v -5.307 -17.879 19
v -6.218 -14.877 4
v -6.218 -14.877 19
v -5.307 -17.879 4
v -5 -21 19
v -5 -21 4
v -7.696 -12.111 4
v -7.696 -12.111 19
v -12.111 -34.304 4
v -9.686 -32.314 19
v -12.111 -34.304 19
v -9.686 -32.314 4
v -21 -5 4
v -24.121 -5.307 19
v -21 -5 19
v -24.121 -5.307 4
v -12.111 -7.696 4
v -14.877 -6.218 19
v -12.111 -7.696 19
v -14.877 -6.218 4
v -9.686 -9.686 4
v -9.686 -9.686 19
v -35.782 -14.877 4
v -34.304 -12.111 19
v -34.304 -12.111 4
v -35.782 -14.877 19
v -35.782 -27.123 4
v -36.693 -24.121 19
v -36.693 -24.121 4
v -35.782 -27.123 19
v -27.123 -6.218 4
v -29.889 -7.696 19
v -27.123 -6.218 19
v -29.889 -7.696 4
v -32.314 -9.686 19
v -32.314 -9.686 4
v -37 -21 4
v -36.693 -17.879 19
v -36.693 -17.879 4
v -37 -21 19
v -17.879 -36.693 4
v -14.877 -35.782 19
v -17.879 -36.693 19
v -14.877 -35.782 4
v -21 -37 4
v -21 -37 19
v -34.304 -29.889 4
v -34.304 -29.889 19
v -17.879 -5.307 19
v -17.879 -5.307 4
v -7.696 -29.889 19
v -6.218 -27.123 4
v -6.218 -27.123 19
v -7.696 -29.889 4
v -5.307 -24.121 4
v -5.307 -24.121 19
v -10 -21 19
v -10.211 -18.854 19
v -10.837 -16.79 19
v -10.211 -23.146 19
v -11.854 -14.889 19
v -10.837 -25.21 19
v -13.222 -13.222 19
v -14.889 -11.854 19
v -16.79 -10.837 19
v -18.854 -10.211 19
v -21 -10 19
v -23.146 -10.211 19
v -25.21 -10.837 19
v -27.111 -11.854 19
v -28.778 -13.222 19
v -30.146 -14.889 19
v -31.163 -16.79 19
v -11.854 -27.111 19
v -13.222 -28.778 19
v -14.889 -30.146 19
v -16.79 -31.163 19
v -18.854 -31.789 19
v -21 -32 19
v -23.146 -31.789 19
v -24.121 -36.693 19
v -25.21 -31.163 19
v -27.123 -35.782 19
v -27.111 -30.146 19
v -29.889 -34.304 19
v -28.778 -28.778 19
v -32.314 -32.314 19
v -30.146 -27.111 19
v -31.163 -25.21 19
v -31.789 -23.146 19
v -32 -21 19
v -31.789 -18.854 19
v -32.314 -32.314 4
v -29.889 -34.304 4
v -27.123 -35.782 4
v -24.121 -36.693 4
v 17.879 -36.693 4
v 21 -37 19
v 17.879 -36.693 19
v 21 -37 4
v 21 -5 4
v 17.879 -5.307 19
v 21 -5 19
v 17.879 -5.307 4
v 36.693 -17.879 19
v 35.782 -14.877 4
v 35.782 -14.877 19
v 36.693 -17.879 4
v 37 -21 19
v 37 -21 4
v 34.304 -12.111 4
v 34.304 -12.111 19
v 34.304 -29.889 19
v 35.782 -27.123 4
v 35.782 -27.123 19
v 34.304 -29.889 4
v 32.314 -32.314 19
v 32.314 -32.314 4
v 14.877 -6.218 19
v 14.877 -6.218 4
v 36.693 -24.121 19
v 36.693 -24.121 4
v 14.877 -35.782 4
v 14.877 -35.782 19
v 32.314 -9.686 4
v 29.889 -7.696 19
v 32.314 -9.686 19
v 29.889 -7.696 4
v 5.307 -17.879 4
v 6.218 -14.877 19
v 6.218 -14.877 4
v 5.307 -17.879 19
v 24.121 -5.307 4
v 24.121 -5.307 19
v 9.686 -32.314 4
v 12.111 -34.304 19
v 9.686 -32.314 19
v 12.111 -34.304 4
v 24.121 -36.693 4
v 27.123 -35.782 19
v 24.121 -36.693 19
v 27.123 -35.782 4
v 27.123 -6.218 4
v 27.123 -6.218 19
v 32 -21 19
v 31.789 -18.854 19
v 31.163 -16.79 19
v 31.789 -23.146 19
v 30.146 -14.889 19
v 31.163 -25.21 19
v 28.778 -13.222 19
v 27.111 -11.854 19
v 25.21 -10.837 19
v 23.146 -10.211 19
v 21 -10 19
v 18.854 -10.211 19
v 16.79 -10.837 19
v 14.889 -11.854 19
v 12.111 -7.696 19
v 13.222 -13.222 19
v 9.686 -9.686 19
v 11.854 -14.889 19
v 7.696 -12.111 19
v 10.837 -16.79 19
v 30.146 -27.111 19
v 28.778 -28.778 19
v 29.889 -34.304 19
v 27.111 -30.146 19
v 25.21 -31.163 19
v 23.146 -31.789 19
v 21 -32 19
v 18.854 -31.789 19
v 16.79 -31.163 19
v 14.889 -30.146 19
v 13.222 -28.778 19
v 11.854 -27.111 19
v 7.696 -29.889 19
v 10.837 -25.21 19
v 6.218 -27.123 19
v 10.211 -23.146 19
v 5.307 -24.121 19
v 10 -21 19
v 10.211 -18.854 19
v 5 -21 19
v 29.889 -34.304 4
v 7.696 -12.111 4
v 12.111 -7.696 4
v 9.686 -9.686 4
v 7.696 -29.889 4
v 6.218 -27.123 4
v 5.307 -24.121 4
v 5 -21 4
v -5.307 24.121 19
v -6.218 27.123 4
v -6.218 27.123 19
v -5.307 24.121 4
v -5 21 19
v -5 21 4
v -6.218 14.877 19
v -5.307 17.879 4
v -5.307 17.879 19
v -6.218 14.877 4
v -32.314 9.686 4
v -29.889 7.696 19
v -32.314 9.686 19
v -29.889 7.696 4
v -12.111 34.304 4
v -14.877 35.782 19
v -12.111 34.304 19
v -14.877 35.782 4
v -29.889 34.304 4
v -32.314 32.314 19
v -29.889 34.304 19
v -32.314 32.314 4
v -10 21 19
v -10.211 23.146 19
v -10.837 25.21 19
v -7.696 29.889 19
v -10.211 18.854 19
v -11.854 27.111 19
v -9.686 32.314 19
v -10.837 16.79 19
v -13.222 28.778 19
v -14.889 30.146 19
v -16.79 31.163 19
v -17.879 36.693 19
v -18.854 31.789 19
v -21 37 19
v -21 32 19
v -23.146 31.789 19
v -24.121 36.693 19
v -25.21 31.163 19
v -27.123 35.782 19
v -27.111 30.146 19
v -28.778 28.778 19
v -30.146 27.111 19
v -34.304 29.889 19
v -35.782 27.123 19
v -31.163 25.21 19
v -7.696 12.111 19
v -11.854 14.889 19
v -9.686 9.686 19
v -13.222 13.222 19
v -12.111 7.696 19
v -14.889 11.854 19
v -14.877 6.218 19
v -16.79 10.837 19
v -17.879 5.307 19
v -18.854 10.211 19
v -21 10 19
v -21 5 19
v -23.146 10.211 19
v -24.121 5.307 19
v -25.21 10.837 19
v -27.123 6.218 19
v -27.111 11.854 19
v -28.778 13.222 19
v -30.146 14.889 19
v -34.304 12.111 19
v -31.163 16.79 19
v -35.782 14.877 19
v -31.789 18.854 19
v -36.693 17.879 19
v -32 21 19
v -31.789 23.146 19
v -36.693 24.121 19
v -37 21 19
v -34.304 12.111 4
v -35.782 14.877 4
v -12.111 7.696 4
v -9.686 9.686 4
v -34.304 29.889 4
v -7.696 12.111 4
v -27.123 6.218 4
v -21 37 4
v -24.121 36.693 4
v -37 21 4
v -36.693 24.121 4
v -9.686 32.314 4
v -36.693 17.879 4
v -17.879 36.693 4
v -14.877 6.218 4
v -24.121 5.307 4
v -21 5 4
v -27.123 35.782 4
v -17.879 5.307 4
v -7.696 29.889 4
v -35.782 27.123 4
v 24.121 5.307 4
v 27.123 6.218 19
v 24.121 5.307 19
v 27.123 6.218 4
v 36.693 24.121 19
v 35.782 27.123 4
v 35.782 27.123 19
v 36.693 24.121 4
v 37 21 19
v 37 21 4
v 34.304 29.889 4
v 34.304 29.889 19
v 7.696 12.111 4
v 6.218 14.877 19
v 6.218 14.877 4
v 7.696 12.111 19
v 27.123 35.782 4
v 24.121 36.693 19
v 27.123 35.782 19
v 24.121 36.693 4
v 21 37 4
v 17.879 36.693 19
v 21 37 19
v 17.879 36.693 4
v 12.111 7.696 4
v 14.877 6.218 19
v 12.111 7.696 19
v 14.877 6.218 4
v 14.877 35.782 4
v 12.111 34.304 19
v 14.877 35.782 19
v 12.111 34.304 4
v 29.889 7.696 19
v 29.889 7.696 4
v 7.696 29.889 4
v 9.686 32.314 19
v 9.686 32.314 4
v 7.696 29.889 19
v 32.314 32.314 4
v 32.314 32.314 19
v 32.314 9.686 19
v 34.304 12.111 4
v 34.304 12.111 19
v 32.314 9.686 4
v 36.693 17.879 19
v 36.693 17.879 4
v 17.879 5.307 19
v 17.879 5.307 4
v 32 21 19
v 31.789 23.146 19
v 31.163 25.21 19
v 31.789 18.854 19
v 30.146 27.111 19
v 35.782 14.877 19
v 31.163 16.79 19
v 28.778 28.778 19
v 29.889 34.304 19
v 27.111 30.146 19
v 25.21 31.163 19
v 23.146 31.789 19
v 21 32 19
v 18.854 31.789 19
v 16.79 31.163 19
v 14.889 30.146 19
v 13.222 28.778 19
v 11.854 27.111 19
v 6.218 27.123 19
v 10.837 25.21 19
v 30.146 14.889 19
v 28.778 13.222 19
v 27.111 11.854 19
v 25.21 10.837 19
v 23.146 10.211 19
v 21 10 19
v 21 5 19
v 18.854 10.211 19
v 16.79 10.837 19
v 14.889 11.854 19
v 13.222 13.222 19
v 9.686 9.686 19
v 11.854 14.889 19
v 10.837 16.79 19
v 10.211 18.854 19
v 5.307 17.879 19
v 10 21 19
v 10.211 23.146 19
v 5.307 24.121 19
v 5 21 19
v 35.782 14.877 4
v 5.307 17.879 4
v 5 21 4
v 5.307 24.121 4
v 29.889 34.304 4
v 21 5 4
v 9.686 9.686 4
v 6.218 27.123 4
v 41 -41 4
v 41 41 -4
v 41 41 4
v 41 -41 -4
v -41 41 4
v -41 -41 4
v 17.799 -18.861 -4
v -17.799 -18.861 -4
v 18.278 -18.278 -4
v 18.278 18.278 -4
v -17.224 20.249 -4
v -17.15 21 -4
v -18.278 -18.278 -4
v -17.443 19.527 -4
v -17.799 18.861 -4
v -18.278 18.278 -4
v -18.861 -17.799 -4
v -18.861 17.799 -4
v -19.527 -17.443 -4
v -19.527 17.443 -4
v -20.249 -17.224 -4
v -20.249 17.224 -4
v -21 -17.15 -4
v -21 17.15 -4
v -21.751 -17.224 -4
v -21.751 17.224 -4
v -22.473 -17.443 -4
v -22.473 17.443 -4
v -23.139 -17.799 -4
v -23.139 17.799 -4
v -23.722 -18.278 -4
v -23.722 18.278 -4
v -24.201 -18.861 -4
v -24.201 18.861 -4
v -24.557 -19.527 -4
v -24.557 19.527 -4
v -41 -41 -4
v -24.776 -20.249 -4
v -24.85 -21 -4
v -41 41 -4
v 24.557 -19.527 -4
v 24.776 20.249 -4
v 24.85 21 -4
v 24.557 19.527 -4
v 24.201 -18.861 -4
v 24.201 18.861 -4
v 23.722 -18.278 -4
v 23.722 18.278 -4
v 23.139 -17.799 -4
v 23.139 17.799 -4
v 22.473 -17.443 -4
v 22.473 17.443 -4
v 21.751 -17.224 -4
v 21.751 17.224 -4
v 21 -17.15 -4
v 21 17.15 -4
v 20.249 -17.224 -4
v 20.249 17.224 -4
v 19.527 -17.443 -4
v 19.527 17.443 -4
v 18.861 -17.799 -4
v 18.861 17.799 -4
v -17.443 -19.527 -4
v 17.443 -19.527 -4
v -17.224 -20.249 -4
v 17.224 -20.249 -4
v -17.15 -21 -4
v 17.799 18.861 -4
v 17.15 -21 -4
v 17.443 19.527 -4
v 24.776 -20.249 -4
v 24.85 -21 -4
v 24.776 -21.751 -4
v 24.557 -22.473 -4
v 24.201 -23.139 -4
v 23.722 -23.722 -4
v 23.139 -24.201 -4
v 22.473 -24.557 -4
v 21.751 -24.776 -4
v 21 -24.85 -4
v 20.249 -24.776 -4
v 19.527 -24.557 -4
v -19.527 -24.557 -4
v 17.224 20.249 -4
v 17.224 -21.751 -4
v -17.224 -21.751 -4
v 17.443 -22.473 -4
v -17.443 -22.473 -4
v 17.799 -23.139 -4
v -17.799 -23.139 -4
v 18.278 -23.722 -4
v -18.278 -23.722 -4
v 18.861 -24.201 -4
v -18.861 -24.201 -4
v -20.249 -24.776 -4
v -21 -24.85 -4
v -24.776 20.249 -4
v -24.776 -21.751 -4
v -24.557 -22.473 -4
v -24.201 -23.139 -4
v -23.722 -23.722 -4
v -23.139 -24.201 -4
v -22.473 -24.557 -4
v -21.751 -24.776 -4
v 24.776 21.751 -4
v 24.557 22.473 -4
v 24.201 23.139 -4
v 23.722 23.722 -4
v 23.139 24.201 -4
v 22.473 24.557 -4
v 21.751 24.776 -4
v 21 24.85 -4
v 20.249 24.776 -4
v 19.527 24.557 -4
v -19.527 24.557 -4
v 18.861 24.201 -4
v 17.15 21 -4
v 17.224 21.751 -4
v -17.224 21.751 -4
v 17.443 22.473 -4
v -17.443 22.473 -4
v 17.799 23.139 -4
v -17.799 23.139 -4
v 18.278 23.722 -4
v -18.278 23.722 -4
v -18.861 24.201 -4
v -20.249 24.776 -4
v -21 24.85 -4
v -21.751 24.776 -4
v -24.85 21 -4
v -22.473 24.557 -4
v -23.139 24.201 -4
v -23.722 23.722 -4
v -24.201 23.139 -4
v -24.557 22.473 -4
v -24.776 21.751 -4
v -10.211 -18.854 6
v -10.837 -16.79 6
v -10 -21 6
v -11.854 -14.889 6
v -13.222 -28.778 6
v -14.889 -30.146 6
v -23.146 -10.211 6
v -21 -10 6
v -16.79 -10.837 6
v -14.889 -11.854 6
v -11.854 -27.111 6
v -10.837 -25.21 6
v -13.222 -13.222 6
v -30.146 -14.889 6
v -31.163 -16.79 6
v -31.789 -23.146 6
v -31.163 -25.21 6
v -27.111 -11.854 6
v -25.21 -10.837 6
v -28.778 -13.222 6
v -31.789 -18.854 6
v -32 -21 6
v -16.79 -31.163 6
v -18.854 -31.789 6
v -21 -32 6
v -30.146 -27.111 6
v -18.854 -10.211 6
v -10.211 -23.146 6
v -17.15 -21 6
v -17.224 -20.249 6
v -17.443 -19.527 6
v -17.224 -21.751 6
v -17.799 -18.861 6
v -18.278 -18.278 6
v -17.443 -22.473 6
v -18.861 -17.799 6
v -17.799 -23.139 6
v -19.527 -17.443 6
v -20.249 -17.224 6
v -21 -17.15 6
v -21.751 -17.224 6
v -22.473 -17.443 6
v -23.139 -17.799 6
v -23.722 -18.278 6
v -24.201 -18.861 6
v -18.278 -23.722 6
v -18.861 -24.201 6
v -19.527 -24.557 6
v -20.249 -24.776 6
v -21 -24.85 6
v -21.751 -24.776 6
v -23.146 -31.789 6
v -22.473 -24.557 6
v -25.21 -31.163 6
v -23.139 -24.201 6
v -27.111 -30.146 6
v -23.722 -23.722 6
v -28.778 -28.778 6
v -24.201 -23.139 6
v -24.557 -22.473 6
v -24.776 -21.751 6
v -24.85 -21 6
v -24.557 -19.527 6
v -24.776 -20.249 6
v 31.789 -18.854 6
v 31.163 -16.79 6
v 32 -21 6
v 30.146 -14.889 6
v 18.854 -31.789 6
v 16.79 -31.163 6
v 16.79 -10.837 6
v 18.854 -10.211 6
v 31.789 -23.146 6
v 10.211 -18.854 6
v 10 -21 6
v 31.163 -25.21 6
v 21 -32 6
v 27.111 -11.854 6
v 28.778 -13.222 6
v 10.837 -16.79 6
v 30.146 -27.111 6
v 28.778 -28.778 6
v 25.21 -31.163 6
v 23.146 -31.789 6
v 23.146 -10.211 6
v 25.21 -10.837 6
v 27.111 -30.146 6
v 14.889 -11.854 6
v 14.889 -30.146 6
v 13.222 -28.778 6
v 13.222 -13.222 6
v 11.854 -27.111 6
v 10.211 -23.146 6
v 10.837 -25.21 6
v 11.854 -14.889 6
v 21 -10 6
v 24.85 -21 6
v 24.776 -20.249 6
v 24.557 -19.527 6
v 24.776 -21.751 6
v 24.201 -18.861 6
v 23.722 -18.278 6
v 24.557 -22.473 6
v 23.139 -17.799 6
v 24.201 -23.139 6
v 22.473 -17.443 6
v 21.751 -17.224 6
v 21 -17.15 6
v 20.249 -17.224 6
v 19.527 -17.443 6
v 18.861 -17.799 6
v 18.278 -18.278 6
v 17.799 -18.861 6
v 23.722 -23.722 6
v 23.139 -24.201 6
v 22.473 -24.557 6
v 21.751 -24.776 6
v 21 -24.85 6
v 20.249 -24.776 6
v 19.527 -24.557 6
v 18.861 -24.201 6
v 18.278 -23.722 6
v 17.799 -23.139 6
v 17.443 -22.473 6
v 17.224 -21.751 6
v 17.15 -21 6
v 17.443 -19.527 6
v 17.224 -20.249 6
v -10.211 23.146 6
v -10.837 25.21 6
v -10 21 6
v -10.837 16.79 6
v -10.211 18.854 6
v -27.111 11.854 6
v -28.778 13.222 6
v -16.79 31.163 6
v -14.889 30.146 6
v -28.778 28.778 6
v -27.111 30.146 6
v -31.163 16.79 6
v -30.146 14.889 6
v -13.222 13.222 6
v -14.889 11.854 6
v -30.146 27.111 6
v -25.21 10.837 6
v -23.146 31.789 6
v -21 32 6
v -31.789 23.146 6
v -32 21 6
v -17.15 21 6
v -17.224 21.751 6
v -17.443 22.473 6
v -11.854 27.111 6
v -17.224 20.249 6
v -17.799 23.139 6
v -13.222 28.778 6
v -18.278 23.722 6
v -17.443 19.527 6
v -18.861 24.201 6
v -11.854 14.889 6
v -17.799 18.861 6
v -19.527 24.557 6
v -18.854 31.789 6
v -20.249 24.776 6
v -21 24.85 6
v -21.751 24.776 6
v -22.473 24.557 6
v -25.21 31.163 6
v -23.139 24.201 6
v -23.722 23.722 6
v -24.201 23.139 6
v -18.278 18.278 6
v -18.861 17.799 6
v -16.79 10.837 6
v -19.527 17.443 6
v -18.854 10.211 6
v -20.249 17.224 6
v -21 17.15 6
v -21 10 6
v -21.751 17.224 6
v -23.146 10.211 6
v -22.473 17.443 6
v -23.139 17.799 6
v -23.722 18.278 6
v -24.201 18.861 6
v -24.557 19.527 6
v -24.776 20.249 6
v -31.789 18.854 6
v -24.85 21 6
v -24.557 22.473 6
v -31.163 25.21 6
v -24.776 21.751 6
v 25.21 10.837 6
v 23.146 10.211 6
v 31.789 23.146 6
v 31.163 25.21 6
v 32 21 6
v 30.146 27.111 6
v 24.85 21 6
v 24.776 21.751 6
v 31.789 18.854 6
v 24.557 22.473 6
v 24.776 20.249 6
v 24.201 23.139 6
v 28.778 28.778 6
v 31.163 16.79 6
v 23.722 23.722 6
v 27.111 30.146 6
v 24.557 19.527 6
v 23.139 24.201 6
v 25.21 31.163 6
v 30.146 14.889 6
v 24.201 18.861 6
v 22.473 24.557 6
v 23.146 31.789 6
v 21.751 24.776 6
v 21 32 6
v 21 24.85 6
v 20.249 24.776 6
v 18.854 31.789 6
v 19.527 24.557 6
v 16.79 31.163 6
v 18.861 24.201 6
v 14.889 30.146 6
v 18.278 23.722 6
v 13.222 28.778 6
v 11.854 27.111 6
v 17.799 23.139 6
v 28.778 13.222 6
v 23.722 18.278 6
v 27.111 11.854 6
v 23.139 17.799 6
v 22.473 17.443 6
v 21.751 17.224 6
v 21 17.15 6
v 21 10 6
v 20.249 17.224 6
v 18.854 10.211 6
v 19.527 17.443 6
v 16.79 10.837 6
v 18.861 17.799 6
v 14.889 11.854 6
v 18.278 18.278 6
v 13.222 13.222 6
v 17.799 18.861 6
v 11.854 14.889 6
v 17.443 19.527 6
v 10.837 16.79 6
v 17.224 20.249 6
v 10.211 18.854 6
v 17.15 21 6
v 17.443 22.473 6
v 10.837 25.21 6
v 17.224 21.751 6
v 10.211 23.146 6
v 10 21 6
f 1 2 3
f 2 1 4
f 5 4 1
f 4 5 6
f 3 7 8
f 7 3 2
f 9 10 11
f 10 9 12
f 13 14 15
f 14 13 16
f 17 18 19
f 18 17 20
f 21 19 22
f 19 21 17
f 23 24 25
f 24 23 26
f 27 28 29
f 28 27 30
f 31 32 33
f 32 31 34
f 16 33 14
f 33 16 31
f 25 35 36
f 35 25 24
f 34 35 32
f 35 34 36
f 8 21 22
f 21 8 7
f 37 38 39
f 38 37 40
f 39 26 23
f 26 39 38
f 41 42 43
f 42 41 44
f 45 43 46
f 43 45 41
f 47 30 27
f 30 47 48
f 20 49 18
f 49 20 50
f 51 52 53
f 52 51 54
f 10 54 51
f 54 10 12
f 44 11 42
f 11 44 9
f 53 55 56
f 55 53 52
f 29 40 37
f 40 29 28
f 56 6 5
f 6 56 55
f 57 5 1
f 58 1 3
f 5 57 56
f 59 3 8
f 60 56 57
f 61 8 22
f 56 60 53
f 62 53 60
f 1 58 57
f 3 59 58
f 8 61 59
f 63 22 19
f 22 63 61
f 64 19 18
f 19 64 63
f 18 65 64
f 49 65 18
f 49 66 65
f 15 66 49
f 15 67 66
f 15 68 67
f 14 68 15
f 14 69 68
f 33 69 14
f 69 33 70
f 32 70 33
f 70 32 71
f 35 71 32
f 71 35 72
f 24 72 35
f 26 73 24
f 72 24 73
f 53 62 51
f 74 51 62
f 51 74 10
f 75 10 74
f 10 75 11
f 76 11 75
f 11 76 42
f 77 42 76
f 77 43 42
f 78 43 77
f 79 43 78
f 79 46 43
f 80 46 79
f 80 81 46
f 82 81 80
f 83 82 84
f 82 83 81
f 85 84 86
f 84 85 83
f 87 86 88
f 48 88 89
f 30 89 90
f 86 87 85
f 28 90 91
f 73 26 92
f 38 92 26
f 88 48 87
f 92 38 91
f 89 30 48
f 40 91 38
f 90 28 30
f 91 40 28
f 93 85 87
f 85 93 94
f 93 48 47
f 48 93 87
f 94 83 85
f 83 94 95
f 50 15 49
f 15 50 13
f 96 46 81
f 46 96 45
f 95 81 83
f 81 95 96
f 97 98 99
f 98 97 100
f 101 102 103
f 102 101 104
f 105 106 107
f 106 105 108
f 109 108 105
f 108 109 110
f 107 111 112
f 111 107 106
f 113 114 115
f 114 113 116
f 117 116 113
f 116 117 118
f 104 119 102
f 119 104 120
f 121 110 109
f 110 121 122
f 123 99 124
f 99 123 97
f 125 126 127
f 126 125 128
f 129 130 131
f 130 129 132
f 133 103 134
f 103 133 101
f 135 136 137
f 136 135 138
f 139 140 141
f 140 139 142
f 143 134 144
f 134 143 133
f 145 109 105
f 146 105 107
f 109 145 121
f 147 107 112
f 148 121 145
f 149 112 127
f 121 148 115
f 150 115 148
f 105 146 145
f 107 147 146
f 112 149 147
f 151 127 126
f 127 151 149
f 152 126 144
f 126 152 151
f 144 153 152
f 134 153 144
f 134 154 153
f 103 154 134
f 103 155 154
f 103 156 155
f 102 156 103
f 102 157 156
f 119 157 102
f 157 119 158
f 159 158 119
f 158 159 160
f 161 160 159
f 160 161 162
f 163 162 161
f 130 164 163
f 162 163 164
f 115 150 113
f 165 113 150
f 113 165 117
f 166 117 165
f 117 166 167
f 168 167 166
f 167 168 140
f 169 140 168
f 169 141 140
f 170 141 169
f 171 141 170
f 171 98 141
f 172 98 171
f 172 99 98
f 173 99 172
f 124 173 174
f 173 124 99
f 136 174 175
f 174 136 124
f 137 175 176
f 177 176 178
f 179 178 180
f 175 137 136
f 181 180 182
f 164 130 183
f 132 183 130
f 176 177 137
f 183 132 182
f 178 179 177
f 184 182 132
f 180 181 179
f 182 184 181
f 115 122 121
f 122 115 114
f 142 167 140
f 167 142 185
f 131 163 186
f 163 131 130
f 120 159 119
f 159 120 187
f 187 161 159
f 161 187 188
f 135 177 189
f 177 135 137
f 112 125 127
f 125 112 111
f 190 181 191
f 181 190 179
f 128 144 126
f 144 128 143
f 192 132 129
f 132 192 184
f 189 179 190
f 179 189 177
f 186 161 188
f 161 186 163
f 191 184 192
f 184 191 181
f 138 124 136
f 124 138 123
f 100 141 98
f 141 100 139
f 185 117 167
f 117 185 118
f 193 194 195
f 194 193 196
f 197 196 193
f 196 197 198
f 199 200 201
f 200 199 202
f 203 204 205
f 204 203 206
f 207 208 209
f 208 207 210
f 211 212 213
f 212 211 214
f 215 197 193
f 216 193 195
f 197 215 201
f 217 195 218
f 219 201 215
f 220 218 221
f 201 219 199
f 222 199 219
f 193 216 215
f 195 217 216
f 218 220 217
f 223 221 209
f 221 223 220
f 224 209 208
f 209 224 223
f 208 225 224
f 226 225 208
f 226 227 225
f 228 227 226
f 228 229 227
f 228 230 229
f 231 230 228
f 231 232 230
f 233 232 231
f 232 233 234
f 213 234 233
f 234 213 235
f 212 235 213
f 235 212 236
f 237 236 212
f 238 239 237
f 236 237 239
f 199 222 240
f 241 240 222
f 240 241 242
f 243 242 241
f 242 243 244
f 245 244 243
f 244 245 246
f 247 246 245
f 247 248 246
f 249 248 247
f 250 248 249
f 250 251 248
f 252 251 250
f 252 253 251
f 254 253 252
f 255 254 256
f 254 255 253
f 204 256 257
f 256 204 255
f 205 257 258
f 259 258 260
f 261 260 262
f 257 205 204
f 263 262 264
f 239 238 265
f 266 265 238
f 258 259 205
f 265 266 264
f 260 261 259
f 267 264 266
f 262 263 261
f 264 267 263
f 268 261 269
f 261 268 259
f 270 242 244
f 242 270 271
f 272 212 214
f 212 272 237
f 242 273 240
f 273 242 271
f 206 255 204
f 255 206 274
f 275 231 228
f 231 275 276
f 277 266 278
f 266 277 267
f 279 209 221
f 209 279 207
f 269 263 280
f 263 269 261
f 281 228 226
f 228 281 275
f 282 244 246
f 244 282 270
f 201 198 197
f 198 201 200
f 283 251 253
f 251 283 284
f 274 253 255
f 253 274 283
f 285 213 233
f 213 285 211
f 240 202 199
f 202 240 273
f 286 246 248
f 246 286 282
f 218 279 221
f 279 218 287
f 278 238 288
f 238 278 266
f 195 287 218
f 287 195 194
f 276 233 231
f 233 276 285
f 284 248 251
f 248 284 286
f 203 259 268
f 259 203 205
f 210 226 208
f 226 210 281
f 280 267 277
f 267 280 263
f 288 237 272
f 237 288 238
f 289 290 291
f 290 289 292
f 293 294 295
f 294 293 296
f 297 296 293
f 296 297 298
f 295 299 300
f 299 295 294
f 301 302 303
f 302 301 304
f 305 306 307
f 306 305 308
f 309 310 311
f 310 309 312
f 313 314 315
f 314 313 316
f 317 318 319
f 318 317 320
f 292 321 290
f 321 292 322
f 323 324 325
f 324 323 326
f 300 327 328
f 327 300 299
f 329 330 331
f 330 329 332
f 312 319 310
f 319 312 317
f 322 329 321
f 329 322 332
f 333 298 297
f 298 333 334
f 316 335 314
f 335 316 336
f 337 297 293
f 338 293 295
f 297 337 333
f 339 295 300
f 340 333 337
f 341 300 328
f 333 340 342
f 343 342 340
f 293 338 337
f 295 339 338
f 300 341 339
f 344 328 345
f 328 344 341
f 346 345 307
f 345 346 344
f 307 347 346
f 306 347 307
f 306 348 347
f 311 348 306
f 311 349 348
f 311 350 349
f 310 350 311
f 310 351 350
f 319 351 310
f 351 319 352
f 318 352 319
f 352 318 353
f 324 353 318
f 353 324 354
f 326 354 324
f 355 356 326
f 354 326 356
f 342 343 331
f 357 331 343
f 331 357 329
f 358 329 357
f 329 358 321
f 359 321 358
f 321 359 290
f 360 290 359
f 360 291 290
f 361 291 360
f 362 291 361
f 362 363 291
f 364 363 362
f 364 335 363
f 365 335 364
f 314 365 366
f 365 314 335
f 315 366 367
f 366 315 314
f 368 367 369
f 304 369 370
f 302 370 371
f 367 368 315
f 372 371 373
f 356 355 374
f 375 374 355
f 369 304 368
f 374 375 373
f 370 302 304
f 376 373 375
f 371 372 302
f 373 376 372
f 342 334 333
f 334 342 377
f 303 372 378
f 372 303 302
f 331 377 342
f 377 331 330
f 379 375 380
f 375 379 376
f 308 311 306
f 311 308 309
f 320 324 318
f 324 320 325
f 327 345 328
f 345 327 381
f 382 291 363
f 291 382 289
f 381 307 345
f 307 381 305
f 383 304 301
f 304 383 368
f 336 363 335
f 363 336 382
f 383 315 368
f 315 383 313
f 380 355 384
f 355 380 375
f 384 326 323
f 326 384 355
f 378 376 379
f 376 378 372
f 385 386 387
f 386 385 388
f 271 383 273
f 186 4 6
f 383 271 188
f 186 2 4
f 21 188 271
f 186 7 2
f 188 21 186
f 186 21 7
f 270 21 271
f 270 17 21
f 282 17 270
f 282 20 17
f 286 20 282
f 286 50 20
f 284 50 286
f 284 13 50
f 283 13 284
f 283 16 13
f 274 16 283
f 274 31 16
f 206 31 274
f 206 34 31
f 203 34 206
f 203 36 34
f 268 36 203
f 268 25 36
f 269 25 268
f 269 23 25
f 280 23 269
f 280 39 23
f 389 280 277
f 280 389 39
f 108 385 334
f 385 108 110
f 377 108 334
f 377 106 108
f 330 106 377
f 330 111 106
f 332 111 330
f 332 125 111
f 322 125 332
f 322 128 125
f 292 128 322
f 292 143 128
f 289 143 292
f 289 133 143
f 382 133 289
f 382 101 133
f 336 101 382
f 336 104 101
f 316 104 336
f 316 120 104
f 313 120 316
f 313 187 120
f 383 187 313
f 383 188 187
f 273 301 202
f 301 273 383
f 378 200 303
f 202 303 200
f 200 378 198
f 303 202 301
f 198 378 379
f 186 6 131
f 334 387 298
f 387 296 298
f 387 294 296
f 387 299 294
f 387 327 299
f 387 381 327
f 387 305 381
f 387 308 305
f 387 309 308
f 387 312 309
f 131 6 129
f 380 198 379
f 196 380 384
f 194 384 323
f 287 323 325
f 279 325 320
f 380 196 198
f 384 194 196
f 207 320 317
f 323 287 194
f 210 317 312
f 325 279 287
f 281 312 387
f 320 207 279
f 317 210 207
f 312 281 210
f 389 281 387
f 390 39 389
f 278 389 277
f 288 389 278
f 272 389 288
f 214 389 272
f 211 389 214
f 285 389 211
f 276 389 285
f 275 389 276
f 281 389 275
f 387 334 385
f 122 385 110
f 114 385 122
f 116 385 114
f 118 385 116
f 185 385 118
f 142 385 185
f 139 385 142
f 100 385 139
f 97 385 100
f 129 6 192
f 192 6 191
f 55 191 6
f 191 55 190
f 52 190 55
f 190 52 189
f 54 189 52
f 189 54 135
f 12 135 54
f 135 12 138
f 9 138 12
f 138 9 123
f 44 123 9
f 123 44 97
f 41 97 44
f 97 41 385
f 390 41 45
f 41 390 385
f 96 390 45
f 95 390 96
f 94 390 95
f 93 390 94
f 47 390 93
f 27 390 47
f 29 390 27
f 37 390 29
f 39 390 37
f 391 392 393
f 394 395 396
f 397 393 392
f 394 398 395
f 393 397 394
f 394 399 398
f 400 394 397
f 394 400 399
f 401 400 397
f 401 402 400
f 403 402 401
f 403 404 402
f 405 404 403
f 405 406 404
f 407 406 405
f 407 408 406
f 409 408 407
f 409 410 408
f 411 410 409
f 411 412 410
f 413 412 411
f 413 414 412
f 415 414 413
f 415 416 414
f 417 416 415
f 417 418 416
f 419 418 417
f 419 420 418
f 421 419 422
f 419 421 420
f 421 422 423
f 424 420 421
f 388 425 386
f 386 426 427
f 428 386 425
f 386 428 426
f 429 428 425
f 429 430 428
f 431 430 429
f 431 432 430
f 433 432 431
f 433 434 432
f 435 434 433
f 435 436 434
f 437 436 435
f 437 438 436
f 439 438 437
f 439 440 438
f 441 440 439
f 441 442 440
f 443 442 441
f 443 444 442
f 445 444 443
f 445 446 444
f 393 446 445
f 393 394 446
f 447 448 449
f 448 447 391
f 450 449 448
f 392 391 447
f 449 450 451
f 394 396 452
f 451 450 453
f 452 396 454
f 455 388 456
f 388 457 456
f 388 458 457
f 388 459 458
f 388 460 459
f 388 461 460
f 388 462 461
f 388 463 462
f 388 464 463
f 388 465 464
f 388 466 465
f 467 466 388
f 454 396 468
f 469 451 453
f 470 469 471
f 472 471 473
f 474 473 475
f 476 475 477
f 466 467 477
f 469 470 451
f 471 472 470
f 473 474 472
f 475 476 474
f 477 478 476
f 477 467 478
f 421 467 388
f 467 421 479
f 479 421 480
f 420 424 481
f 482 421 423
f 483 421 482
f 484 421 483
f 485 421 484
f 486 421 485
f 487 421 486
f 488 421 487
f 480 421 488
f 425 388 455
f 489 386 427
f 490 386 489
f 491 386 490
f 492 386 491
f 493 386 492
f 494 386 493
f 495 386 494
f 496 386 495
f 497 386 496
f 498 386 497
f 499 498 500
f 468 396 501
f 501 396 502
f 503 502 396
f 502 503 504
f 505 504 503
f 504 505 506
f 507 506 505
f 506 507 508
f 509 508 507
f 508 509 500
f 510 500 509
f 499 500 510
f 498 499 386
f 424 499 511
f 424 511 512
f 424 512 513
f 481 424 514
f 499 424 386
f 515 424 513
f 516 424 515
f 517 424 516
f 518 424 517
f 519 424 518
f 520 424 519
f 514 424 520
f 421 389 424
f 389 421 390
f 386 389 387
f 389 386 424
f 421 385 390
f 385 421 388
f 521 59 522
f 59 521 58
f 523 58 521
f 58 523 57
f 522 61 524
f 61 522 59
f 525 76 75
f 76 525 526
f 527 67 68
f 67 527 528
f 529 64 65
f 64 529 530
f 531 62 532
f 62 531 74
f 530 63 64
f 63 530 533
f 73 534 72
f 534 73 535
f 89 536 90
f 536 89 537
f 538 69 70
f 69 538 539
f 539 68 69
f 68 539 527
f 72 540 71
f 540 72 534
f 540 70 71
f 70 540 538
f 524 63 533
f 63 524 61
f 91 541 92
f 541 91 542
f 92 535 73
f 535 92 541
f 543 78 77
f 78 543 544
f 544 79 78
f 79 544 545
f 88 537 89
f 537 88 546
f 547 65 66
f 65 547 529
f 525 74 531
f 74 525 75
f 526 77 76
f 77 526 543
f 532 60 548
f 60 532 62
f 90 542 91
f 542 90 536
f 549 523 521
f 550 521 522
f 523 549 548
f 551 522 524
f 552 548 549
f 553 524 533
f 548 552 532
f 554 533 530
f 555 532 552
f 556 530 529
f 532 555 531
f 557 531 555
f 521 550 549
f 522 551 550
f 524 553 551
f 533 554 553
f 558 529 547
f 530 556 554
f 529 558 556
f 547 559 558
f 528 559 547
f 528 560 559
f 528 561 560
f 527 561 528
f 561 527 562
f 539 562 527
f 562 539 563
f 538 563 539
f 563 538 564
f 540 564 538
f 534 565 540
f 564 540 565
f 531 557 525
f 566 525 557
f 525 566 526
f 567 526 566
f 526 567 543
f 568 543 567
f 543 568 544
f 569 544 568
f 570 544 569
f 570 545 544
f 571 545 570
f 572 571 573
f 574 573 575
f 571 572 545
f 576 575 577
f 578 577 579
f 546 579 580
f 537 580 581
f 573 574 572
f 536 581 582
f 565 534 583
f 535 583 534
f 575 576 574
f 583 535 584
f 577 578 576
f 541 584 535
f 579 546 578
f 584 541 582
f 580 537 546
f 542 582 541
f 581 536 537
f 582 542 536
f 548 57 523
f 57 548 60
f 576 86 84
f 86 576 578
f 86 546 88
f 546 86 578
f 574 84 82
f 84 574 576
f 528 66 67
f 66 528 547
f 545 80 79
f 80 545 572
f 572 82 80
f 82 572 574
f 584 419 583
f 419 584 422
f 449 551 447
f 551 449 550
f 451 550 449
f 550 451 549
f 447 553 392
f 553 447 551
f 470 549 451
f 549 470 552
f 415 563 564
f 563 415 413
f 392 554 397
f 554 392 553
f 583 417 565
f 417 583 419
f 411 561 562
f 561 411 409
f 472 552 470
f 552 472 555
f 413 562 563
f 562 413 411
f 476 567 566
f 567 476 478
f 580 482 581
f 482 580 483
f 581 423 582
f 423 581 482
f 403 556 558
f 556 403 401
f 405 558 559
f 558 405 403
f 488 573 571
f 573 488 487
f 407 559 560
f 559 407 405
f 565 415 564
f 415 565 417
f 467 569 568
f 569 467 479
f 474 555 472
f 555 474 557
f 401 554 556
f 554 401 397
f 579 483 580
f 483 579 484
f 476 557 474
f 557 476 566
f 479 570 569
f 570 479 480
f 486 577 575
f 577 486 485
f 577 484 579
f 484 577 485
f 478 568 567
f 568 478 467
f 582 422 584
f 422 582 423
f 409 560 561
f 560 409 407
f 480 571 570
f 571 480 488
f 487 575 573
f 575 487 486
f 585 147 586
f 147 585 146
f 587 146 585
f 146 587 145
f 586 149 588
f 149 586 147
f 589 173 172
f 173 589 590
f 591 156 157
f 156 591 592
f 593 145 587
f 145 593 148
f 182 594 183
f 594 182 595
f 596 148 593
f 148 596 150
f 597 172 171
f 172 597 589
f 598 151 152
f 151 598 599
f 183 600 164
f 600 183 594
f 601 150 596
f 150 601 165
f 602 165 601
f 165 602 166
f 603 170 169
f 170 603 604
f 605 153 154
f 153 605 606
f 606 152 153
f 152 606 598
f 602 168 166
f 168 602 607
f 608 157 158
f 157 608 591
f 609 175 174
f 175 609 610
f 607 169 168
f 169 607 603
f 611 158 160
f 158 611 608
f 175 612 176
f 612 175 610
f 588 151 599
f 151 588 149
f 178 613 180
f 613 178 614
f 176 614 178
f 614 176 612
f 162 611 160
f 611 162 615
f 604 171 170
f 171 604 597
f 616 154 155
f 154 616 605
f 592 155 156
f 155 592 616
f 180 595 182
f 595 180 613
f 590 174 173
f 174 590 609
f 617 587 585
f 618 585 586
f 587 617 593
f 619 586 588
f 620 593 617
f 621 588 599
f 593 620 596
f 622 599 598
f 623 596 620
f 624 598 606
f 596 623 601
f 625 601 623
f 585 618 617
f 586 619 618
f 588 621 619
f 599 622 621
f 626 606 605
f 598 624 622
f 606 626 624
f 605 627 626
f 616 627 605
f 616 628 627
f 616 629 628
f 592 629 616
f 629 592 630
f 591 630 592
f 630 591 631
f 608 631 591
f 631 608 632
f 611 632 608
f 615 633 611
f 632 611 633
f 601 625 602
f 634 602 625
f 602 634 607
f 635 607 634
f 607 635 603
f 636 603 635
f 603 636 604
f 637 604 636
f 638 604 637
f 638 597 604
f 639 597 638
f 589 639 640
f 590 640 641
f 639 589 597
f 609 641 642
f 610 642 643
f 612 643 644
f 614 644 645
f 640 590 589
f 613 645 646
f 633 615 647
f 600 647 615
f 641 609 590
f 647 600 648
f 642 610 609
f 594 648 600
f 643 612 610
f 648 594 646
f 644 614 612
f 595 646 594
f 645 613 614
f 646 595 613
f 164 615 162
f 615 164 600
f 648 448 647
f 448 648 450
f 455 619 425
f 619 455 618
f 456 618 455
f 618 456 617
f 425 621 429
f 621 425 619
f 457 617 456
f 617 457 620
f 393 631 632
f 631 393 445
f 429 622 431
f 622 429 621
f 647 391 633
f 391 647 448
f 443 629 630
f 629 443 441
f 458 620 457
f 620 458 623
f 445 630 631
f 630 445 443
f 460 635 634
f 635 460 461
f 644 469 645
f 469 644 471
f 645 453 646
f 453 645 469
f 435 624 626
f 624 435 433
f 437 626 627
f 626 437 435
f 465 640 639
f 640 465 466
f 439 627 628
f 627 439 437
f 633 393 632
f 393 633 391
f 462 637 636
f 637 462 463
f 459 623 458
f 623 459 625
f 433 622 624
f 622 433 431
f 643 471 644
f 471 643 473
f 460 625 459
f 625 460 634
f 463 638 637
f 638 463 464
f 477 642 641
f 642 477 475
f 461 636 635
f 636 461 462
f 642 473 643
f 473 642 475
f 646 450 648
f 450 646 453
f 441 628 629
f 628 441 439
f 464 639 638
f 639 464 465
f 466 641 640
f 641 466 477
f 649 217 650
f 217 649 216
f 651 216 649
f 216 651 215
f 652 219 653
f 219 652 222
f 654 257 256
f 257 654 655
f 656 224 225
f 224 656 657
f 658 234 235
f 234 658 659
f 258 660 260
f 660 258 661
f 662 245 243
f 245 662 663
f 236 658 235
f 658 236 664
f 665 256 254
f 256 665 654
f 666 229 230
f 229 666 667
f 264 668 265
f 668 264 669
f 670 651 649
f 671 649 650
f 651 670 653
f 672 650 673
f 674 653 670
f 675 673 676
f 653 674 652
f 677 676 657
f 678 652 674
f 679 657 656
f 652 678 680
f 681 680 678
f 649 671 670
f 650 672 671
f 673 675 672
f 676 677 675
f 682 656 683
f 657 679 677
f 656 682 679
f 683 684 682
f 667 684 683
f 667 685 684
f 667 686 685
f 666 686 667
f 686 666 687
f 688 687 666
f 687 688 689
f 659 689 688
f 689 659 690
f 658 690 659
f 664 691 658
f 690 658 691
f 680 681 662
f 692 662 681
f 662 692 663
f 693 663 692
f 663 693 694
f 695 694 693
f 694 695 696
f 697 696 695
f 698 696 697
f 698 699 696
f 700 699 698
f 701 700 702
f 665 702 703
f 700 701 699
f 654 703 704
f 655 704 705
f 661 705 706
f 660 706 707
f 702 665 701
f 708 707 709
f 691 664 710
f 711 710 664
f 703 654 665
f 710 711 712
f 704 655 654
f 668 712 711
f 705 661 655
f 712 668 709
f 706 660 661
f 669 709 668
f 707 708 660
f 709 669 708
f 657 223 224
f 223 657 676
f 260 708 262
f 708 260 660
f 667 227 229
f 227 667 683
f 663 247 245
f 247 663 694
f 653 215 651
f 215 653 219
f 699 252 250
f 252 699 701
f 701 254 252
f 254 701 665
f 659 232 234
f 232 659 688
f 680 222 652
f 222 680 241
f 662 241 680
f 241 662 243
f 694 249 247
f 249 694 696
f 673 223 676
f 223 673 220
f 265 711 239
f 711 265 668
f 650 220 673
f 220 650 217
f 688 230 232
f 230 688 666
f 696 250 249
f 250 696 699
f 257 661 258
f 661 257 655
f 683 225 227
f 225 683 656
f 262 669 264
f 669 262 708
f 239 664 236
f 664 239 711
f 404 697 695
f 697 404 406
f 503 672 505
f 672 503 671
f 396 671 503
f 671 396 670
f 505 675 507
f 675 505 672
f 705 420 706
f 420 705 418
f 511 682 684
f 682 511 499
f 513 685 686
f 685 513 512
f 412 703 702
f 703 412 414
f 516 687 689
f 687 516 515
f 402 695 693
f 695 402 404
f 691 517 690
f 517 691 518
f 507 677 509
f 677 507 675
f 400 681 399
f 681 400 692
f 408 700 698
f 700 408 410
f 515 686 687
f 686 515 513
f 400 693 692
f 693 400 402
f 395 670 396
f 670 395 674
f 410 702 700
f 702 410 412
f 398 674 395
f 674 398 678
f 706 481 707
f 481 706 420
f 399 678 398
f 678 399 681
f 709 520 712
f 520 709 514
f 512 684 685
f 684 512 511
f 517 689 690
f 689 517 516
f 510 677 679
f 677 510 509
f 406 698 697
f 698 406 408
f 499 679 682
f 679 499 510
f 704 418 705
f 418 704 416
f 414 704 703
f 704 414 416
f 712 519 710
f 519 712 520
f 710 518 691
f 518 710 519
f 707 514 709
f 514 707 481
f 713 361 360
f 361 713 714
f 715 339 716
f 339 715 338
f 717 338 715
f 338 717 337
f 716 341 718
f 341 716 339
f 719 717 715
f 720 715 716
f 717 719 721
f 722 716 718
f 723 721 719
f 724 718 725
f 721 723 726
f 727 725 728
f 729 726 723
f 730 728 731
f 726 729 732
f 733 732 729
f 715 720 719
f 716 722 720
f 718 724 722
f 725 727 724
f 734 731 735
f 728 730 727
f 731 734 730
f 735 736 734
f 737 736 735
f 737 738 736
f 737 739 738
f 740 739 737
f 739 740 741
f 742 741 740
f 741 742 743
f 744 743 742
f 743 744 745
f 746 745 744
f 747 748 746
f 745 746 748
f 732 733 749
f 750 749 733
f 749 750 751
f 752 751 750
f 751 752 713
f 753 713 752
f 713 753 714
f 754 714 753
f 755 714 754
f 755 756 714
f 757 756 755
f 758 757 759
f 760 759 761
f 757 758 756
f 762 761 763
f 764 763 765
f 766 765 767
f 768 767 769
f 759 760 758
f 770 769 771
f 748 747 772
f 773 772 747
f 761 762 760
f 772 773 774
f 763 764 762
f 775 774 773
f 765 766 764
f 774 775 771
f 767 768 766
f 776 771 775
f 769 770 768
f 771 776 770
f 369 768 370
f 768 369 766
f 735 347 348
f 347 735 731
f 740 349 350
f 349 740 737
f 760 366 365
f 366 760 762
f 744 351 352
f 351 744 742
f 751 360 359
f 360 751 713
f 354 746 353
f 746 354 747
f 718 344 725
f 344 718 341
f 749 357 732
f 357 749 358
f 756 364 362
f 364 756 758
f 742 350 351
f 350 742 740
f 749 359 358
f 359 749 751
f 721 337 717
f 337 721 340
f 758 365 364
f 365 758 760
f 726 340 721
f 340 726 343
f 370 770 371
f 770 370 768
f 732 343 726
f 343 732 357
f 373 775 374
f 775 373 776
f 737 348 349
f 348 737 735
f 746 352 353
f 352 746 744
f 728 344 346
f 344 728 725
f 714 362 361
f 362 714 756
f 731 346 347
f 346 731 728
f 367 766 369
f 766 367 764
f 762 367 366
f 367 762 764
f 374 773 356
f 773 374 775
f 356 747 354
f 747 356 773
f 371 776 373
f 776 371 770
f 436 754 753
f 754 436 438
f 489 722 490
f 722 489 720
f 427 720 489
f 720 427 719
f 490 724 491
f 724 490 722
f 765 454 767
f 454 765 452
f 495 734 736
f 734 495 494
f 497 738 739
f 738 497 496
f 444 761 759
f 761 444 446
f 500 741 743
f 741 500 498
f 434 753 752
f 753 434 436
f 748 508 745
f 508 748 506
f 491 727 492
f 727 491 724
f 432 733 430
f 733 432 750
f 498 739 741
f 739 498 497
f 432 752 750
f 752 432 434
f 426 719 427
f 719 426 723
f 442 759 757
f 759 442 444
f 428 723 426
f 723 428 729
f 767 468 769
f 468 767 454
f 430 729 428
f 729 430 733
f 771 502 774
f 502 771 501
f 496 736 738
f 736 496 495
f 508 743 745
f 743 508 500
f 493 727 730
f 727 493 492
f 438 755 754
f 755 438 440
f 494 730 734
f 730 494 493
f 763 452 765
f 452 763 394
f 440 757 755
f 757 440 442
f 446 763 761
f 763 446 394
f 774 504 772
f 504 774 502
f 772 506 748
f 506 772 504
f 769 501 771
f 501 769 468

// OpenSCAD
$fn = 32;

// ----------------------------------------------------------------------
// Socket pad plate
// bosses with counterbored sockets for the screws
// ----------------------------------------------------------------------

// --- parameters (mm) ---
base_t = 8;         // base plate thickness
boss_h = 15;        // boss height above the base plate
boss_d = 32;        // boss diameter
socket_d = 22;      // socket diameter
socket_depth = 13;  // socket depth from the boss face
bolt_d = 7.7;       // screw clearance hole through the socket floor
rows = 2;           // boss rows
cols = 2;           // bosses per row
pitch = 42;         // boss pitch

// --- derived feature positions (mm) ---
height = base_t + boss_h;           // = 23   overall height of the part
plate = [pitch * (cols - 1) + boss_d + 8, pitch * (rows - 1) + boss_d + 8, base_t];  // = [82, 82, 8]   overall size (x, y, z)
span_x = pitch * (cols - 1);        // = 42   distance between outer bosses
span_y = pitch * (rows - 1);        // = 42   distance between boss rows
origin_x = -span_x / 2;             // = -21   X of the first boss
origin_y = -span_y / 2;             // = -21   Y of the first boss
feature_centers = [
  [origin_x + 0 * pitch, origin_y + 0 * pitch],
  [origin_x + 1 * pitch, origin_y + 0 * pitch],
  [origin_x + 0 * pitch, origin_y + 1 * pitch],
  [origin_x + 1 * pitch, origin_y + 1 * pitch]
];   // boss centres: sockets, holes and the pads themselves are placed from here

// base plate, bosses on feature_centers, socket + through hole in each
difference() {
  union() {
    cube(plate, center = true);
    for (centre = feature_centers)
      translate([centre[0], centre[1], plate[2] / 2 - 1])
        cylinder(d = boss_d, h = boss_h + 1);
  }
  for (centre = feature_centers) {
    translate([centre[0], centre[1], plate[2] / 2 + boss_h - socket_depth])
      cylinder(d = socket_d, h = socket_depth + 1);
    translate([centre[0], centre[1], -height])
      cylinder(d = bolt_d, h = 2 * height + 2);  // through the socket floor
  }
}
